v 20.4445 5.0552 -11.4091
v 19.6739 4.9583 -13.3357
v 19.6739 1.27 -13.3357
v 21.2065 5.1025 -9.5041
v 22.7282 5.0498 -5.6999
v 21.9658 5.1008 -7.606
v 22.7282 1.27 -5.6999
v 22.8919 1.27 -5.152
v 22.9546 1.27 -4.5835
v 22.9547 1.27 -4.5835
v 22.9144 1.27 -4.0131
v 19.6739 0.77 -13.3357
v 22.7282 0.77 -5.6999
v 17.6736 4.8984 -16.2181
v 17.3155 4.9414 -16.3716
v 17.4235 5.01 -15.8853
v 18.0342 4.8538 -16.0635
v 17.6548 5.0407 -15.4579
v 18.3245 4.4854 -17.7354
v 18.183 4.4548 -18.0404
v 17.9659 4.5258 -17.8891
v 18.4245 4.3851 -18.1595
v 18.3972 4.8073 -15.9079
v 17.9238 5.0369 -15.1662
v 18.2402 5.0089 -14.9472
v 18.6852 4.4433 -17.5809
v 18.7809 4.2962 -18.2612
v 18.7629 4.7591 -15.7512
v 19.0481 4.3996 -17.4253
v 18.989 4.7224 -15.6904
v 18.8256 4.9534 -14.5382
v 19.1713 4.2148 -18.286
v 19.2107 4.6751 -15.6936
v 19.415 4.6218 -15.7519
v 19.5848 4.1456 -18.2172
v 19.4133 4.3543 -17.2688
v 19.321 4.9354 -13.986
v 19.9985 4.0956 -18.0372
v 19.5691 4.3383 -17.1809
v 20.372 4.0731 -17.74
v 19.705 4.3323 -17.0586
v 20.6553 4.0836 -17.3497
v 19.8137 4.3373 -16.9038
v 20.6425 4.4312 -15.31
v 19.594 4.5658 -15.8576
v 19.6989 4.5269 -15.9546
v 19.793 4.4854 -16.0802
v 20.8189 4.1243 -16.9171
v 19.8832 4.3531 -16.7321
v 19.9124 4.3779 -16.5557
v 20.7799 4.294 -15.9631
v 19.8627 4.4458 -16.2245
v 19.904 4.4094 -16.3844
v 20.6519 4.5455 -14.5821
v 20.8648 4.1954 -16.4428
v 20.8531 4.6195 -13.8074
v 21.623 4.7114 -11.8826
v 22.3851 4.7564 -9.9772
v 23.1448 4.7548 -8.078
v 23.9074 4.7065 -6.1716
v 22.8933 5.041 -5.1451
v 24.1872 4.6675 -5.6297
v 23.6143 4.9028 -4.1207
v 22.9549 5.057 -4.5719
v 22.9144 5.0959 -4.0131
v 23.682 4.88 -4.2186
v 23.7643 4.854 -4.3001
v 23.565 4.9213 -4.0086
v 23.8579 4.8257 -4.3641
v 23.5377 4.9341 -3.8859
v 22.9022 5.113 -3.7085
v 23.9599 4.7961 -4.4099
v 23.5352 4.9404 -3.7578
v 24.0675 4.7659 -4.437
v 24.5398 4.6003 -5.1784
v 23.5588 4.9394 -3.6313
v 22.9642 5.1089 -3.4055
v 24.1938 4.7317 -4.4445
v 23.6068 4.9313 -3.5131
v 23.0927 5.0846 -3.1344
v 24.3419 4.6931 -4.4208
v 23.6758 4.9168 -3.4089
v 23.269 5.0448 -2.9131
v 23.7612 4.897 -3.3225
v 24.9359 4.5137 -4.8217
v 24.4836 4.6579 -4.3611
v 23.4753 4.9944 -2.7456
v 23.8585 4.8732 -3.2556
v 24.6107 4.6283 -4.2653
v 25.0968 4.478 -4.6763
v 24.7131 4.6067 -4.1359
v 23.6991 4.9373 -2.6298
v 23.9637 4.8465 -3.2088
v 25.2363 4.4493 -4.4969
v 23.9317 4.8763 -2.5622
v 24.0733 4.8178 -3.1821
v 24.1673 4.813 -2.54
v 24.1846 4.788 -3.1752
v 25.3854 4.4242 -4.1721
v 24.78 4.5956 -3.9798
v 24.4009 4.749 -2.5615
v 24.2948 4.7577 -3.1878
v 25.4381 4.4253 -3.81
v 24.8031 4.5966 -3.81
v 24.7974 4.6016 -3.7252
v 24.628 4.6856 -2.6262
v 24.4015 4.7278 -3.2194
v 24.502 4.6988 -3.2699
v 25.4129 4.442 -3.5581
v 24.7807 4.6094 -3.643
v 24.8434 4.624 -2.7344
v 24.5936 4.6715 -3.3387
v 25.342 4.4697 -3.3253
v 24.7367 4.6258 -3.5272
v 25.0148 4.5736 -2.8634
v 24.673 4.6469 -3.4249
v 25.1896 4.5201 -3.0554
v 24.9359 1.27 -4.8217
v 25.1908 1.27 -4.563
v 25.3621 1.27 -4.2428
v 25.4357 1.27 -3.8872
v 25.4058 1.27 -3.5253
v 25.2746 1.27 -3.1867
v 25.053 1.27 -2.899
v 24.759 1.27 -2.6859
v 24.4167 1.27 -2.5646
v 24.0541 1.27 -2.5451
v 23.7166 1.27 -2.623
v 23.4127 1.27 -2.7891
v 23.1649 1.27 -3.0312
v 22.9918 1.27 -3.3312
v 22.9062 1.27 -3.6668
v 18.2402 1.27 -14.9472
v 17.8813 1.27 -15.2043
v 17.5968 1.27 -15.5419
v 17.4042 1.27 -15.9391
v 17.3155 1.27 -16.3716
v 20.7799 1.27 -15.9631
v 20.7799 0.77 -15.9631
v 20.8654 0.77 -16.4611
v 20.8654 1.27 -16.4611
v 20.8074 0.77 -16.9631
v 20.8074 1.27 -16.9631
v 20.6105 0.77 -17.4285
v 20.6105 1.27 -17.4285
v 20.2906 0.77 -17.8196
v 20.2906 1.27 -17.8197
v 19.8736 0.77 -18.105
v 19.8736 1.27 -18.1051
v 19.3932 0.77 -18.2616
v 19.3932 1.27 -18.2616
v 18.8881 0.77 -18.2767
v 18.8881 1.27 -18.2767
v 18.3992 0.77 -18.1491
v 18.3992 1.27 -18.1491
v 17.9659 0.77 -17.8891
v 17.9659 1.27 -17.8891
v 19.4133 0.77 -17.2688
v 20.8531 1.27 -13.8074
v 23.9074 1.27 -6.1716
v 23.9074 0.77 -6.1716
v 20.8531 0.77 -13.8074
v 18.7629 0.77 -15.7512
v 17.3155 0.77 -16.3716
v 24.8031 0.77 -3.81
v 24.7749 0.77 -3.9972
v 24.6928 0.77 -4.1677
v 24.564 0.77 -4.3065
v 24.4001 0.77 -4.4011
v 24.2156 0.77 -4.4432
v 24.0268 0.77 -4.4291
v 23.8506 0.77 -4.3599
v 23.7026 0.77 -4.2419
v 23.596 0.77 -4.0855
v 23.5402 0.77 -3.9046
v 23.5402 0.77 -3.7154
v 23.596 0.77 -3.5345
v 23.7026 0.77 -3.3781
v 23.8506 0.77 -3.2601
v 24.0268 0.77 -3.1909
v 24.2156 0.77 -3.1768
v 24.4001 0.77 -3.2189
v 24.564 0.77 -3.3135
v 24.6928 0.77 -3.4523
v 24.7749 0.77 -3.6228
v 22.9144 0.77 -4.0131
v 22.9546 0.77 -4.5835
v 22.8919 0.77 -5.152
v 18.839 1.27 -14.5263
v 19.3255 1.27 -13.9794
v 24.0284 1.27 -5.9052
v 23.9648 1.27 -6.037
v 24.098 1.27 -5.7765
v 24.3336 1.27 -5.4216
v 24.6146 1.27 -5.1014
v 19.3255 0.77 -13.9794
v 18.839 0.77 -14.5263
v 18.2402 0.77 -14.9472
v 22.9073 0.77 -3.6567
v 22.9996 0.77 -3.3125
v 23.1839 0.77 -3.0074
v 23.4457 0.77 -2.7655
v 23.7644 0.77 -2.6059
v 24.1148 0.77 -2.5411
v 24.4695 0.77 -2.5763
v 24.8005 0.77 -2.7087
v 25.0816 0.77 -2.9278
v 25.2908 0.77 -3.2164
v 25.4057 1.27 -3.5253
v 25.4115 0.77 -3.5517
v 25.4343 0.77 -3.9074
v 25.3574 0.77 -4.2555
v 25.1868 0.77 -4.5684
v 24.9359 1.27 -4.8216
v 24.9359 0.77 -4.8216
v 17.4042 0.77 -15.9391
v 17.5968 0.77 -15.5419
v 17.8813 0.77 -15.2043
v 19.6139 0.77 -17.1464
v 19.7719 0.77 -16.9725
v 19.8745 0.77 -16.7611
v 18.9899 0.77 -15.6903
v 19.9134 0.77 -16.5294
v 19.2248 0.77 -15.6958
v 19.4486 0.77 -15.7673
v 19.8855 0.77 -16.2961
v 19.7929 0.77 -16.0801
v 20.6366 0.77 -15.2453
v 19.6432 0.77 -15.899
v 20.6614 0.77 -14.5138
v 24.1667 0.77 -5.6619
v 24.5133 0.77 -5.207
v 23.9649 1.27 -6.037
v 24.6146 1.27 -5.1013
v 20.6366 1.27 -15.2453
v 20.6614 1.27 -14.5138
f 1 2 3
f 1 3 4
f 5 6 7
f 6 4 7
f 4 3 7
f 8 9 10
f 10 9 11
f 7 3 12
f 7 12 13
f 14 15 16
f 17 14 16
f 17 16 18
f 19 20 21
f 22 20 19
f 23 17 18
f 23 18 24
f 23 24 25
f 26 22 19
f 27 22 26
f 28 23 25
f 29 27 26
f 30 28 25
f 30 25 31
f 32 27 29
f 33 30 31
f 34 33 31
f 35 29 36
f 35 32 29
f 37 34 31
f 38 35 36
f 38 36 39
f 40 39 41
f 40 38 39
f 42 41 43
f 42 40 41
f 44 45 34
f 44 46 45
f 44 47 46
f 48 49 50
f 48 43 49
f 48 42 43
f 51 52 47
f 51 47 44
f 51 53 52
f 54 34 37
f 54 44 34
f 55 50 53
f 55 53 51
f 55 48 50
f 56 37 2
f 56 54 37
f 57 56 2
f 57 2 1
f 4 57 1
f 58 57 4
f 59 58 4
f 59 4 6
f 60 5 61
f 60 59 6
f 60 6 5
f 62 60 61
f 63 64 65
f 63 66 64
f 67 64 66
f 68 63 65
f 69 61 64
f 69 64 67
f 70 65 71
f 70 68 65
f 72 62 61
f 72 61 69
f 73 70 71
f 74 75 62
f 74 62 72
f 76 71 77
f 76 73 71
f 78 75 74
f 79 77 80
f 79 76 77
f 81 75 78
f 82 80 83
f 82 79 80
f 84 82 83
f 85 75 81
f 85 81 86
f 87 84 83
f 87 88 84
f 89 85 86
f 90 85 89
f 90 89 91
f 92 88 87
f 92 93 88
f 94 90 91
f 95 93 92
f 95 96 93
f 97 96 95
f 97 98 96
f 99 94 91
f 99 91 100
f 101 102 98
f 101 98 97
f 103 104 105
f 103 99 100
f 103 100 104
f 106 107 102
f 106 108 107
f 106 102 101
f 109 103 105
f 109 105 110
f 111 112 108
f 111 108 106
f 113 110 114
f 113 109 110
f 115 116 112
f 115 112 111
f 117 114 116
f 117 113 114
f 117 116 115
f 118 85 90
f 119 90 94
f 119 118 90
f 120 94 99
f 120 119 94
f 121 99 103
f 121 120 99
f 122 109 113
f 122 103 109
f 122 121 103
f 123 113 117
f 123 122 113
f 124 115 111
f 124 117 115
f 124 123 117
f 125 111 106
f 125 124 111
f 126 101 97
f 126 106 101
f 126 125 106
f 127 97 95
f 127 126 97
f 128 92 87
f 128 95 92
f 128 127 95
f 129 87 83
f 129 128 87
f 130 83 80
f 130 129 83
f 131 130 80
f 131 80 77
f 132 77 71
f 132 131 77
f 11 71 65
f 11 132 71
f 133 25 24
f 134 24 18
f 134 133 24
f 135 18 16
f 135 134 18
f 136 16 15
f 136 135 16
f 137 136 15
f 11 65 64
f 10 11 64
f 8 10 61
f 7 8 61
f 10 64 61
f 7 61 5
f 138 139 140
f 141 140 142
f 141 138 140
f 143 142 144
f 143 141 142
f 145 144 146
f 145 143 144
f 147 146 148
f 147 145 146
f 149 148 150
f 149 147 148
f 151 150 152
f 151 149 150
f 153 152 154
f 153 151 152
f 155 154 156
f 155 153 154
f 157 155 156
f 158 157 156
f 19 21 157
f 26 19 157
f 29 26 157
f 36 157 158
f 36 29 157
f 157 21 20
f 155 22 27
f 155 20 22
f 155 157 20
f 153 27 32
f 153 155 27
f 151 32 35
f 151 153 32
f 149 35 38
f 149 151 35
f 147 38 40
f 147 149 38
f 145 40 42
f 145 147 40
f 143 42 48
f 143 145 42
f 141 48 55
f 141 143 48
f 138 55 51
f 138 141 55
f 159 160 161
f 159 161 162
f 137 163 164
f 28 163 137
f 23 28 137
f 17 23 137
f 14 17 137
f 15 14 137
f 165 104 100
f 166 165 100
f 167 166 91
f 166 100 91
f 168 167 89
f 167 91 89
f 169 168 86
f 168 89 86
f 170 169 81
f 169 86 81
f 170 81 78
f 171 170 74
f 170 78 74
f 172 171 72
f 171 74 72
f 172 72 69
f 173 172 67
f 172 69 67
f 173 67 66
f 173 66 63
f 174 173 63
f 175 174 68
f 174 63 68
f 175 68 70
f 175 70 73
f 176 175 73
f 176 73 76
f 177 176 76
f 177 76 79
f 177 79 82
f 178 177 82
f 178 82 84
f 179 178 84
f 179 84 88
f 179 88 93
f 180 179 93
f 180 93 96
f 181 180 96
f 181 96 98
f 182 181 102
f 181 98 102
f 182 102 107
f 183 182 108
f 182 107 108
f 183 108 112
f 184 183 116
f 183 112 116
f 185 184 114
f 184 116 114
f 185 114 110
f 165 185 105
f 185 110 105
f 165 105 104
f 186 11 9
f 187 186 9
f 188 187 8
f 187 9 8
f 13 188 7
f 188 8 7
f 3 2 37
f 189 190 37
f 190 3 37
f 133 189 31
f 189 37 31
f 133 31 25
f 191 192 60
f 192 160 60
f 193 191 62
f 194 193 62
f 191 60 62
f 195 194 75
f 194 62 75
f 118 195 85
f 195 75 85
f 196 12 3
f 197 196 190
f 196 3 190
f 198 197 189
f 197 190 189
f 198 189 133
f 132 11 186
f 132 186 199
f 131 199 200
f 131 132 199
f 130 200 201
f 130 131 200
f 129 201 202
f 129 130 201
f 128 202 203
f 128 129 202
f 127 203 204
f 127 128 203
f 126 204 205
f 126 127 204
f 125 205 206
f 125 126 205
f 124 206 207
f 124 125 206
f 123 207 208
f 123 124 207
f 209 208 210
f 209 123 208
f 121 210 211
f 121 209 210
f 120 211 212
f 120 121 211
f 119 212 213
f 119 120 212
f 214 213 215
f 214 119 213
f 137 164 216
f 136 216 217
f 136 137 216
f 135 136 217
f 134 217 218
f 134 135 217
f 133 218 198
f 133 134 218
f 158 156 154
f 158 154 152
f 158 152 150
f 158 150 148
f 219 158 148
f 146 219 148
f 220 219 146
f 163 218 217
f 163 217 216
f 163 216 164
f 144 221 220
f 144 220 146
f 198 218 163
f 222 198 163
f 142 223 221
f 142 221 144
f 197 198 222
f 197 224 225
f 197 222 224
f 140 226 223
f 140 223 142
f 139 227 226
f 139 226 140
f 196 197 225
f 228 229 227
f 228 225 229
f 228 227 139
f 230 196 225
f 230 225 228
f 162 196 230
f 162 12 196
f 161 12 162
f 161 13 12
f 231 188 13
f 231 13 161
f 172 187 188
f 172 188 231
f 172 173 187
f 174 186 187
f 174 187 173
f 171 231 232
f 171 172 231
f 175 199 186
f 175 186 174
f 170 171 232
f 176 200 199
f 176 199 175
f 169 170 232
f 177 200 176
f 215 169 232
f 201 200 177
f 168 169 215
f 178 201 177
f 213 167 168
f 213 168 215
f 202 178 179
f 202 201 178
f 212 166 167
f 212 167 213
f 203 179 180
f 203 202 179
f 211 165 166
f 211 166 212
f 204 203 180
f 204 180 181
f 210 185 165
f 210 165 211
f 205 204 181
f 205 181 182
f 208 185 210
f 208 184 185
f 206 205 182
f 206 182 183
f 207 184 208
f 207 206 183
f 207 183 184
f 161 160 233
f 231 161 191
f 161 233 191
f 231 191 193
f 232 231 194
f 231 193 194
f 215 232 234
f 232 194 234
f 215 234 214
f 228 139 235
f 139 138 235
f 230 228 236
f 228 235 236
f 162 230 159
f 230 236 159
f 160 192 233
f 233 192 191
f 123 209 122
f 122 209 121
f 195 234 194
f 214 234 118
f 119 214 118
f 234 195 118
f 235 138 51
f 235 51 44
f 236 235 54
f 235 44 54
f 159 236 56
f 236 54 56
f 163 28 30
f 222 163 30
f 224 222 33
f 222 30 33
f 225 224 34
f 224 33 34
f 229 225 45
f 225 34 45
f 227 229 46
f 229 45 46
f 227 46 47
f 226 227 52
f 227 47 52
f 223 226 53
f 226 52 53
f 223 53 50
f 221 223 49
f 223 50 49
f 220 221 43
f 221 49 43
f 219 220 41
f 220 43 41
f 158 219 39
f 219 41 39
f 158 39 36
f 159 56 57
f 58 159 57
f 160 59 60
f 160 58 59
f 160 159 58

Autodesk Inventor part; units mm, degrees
ref_plane "YZ Plane" through (0, 0, 0) normal (1, 0, 0) x (0, 1, 0)
ref_plane "XZ Plane" through (0, 0, 0) normal (0, 1, 0) x (-1, 0, 0)
sketch "Sketch1" plane through (0, 0, 0) normal (0, 0, 1) x (1, 0, 0)
  line L0 (0, 0) -> (0, 8.6646) construction
  line L1 (20.9931, 1.27) -> (20.9931, 5.715)
  line L2 (20.9931, 5.715) -> (27.9781, 3.81)
  line L3 (27.9781, 3.81) -> (27.9781, 0)
  line L4 (27.9781, 0) -> (20.9931, 0)
  line L5 (20.9931, 1.27) -> (18.4531, 1.27)
  line L6 (18.4531, 1.27) -> (18.4531, 0)
  line L7 (18.4531, 0) -> (20.9931, 0)
  dimension "d0" = 20.9931
  dimension "d1" = 4.445
  dimension "d2" = 1.27
  dimension "d3" = 2.54
  dimension "d4" = 3.81
  dimension "d5" = 6.985
revolve "Revolution1" add sketch "Sketch1" angle 360 about axis through (0, 0, 0) along (0, 1, 0)
ref_plane "Work Plane1" through (0, 3.81, 0) normal (0, 1, 0) x (1, 0, 0)
sketch "Sketch2" plane through (0, 0, 0) normal (0, -1, 0) x (1, 0, 0)
  line L0 (0, 0) -> (-45.8206, 0) construction
  circle A0 centre (0, 0) radius 27.9781 projected
  line L1 (-27.6227, 4.445) -> (-30.5181, 2.54)
  line L2 (-30.5181, 2.54) -> (-30.5181, -2.54)
  line L3 (-30.5181, -2.54) -> (-27.6227, -4.445)
  dimension "d7" = 2.54
  dimension "d8" = 8.89
  dimension "d9" = 5.08
extrude "Extrusion1" add sketch "Sketch2" against normal up to surface (3.81 mm away) contours A0 L3 L2 L1
pattern_circular "Circular Pattern1" count 12 over 360 about axis through (0, 1.905, 0) along (0, -1, 0) of "Extrusion1"
sketch "Sketch3" plane through (0, 1.27, 0) normal (0, 1, 0) x (1, 0, 0)
  circle A0 centre (0, 0) radius 18.4531 projected
  circle A1 centre (0, 0) radius 18.4531 projected
  circle A2 centre (0, 0) radius 20.9931 projected
  circle A3 centre (0, 0) radius 20.9931 projected
  arc A4 (-26.1445, 9.9619) -> (-27.6227, 4.445) centre (0, 0) ccw projected
  arc A5 (-27.6227, 4.445) -> (-27.6227, -4.445) centre (0, 0) ccw projected
  arc A6 (-27.6227, -4.445) -> (-26.1445, -9.9619) centre (0, 0) ccw projected
  arc A7 (-26.1445, -9.9619) -> (-21.6995, -17.6609) centre (0, 0) ccw projected
  arc A8 (-21.6995, -17.6609) -> (-17.6609, -21.6995) centre (0, 0) ccw projected
  arc A9 (-17.6609, -21.6995) -> (-9.9619, -26.1445) centre (0, 0) ccw projected
  arc A10 (-9.9619, -26.1445) -> (-4.445, -27.6227) centre (0, 0) ccw projected
  arc A11 (-4.445, -27.6227) -> (4.445, -27.6227) centre (0, 0) ccw projected
  arc A12 (4.445, -27.6227) -> (9.9619, -26.1445) centre (0, 0) ccw projected
  arc A13 (9.9619, -26.1445) -> (17.6609, -21.6995) centre (0, 0) ccw projected
  arc A14 (17.6609, -21.6995) -> (21.6995, -17.6609) centre (0, 0) ccw projected
  arc A15 (21.6995, -17.6609) -> (26.1445, -9.9619) centre (0, 0) ccw projected
  arc A16 (26.1445, -9.9619) -> (27.6227, -4.445) centre (0, 0) ccw projected
  arc A17 (27.6227, -4.445) -> (27.6227, 4.445) centre (0, 0) ccw projected
  arc A18 (27.6227, 4.445) -> (26.1445, 9.9619) centre (0, 0) ccw projected
  arc A19 (26.1445, 9.9619) -> (21.6995, 17.6609) centre (0, 0) ccw projected
  arc A20 (21.6995, 17.6609) -> (17.6609, 21.6995) centre (0, 0) ccw projected
  arc A21 (17.6609, 21.6995) -> (9.9619, 26.1445) centre (0, 0) ccw projected
  arc A22 (9.9619, 26.1445) -> (4.445, 27.6227) centre (0, 0) ccw projected
  arc A23 (4.445, 27.6227) -> (-4.445, 27.6227) centre (0, 0) ccw projected
  arc A24 (-4.445, 27.6227) -> (-9.9619, 26.1445) centre (0, 0) ccw projected
  arc A25 (-9.9619, 26.1445) -> (-17.6609, 21.6995) centre (0, 0) ccw projected
  arc A26 (-17.6609, 21.6995) -> (-21.6995, 17.6609) centre (0, 0) ccw projected
  arc A27 (-21.6995, 17.6609) -> (-26.1445, 9.9619) centre (0, 0) ccw projected
  circle A28 centre (0, 0) radius 22.8981
  spline S0 degree 2 poles (-20.4865, -10.8927) (-20.2314, -10.7347) (-20.0767, -10.9844) knots 0 0 0 1 1 1
  spline S1 degree 2 poles (-20.0767, -10.9844) (-19.9219, -11.2342) (-20.177, -11.3922) knots 0 0 0 1 1 1
  line L0 (-20.177, -11.3922) -> (-22.4984, -12.8306)
  line L1 (-22.4984, -12.8306) -> (-21.0657, -12.8234)
  spline S2 degree 2 poles (-21.0657, -12.8234) (-20.8353, -12.8371) (-20.7343, -13.0001) knots 0 0 0 1 1 1
  spline S3 degree 2 poles (-20.7343, -13.0001) (-20.6366, -13.1578) (-20.7235, -13.3463) knots 0 0 0 1 1 1
  line L2 (-20.7235, -13.3463) -> (-21.4078, -14.6436)
  line L3 (-21.4078, -14.6436) -> (-19.0627, -13.1905)
  spline S4 degree 2 poles (-19.0627, -13.1905) (-18.8077, -13.0325) (-18.6529, -13.2822) knots 0 0 0 1 1 1
  spline S5 degree 2 poles (-18.6529, -13.2822) (-18.4949, -13.5373) (-18.7499, -13.6953) knots 0 0 0 1 1 1
  line L4 (-18.7499, -13.6953) -> (-21.6577, -15.497)
  spline S6 degree 2 poles (-21.6577, -15.497) (-21.9259, -15.6631) (-22.0936, -15.3923) knots 0 0 0 1 1 1
  spline S7 degree 2 poles (-22.0936, -15.3923) (-22.2093, -15.2057) (-22.1246, -15.0076) knots 0 0 0 1 1 1
  line L5 (-22.1246, -15.0076) -> (-21.3965, -13.3994)
  line L6 (-21.3965, -13.3994) -> (-23.1279, -13.3298)
  spline S8 degree 2 poles (-23.1279, -13.3298) (-23.414, -13.3142) (-23.5248, -13.1355) knots 0 0 0 1 1 1
  spline S9 degree 2 poles (-23.5248, -13.1355) (-23.5932, -13.025) (-23.5178, -12.7709) (-23.3942, -12.6944) knots 0 0 0 1 2 2 2
  line L7 (-23.3942, -12.6944) -> (-20.4865, -10.8927)
  line L8 (-21.4115, -8.1592) -> (-20.6563, -9.942)
  line L9 (-20.6563, -9.942) -> (-23.6894, -11.2268)
  line L10 (-23.6894, -11.2268) -> (-24.4445, -9.444)
  spline S10 degree 2 poles (-24.4445, -9.444) (-24.5591, -9.1734) (-24.2914, -9.06) knots 0 0 0 1 1 1
  spline S11 degree 2 poles (-24.2914, -9.06) (-24.0209, -8.9454) (-23.9063, -9.216) knots 0 0 0 1 1 1
  line L11 (-23.9063, -9.216) -> (-23.3743, -10.4719)
  line L12 (-23.3743, -10.4719) -> (-22.8189, -10.2367)
  line L13 (-22.8189, -10.2367) -> (-23.3171, -9.0605)
  spline S12 degree 2 poles (-23.3171, -9.0605) (-23.4293, -8.7956) (-23.1616, -8.6822) knots 0 0 0 1 1 1
  spline S13 degree 2 poles (-23.1616, -8.6822) (-22.8854, -8.5652) (-22.7732, -8.8301) knots 0 0 0 1 1 1
  line L14 (-22.7732, -8.8301) -> (-22.275, -10.0063)
  line L15 (-22.275, -10.0063) -> (-21.4235, -9.6456)
  line L16 (-21.4235, -9.6456) -> (-21.9554, -8.3897)
  spline S14 degree 2 poles (-21.9554, -8.3897) (-22.07, -8.1191) (-21.8023, -8.0057) knots 0 0 0 1 1 1
  spline S15 degree 2 poles (-21.8023, -8.0057) (-21.5261, -7.8887) (-21.4115, -8.1592) knots 0 0 0 1 1 1
  spline S16 degree 2 poles (-22.8056, -5.2377) (-22.4484, -5.3877) (-22.1014, -5.7752) (-22.015, -6.0818) knots 0 0 0 1 2 2 2
  spline S17 degree 2 poles (-22.015, -6.0818) (-21.8732, -6.5849) (-22.313, -7.0655) knots 0 0 0 1 1 1
  spline S18 degree 2 poles (-22.313, -7.0655) (-22.5945, -7.4918) (-23.3387, -7.7016) knots 0 0 0 1 1 1
  spline S19 degree 2 poles (-23.3387, -7.7016) (-24.1544, -7.9314) (-24.69, -7.6614) knots 0 0 0 1 1 1
  spline S20 degree 2 poles (-24.69, -7.6614) (-25.1213, -7.4423) (-25.2479, -6.9928) knots 0 0 0 1 1 1
  spline S21 degree 2 poles (-25.2479, -6.9928) (-25.3444, -6.6505) (-25.2198, -6.1462) (-24.9563, -5.8953) knots 0 0 0 1 2 2 2
  spline S22 degree 2 poles (-24.9563, -5.8953) (-24.9018, -5.8381) (-24.8303, -5.818) knots 0 0 0 1 1 1
  spline S23 degree 2 poles (-24.8303, -5.818) (-24.7112, -5.7844) (-24.4997, -5.908) (-24.4678, -6.0211) knots 0 0 0 1 2 2 2
  spline S24 degree 2 poles (-24.4678, -6.0211) (-24.4242, -6.1759) (-24.5806, -6.3164) knots 0 0 0 1 1 1
  spline S25 degree 2 poles (-24.5806, -6.3164) (-24.7683, -6.517) (-24.6827, -6.8207) knots 0 0 0 1 1 1
  spline S26 degree 2 poles (-24.6827, -6.8207) (-24.6139, -7.0648) (-24.3475, -7.1664) knots 0 0 0 1 1 1
  spline S27 degree 2 poles (-24.3475, -7.1664) (-24.0157, -7.2947) (-23.4948, -7.1479) knots 0 0 0 1 1 1
  spline S28 degree 2 poles (-23.4948, -7.1479) (-23.0095, -7.0111) (-22.5148, -6.4861) (-22.587, -6.2301) knots 0 0 0 1 2 2 2
  spline S29 degree 2 poles (-22.587, -6.2301) (-22.6767, -5.9116) (-22.9983, -5.774) knots 0 0 0 1 1 1
  spline S30 degree 2 poles (-22.9983, -5.774) (-23.1807, -5.7194) (-23.2168, -5.5914) knots 0 0 0 1 1 1
  spline S31 degree 2 poles (-23.2168, -5.5914) (-23.2487, -5.4783) (-23.1196, -5.2523) (-23.0064, -5.2204) knots 0 0 0 1 2 2 2
  spline S32 degree 2 poles (-23.0064, -5.2204) (-22.9082, -5.1928) (-22.8056, -5.2377) knots 0 0 0 1 1 1
  spline S33 degree 2 poles (-23.0841, -2.194) (-22.7873, -2.1504) (-22.7455, -2.435) knots 0 0 0 1 1 1
  spline S34 degree 2 poles (-22.7455, -2.435) (-22.7028, -2.7257) (-22.9996, -2.7693) knots 0 0 0 1 1 1
  line L17 (-22.9996, -2.7693) -> (-24.1563, -2.9392)
  line L18 (-24.1563, -2.9392) -> (-23.9877, -4.0867)
  line L19 (-23.9877, -4.0867) -> (-22.8311, -3.9168)
  spline S35 degree 2 poles (-22.8311, -3.9168) (-22.5342, -3.8732) (-22.4915, -4.1639) knots 0 0 0 1 1 1
  spline S36 degree 2 poles (-22.4915, -4.1639) (-22.4488, -4.4546) (-22.7456, -4.4982) knots 0 0 0 1 1 1
  line L20 (-22.7456, -4.4982) -> (-25.4599, -4.8969)
  spline S37 degree 2 poles (-25.4599, -4.8969) (-25.7536, -4.9401) (-25.7963, -4.6494) knots 0 0 0 1 1 1
  spline S38 degree 2 poles (-25.7963, -4.6494) (-25.839, -4.3587) (-25.5453, -4.3155) knots 0 0 0 1 1 1
  line L21 (-25.5453, -4.3155) -> (-24.5722, -4.1726)
  line L22 (-24.5722, -4.1726) -> (-24.7408, -3.0251)
  line L23 (-24.7408, -3.0251) -> (-25.7139, -3.168)
  spline S39 degree 2 poles (-25.7139, -3.168) (-26.0076, -3.2112) (-26.0503, -2.9205) knots 0 0 0 1 1 1
  spline S40 degree 2 poles (-26.0503, -2.9205) (-26.0921, -2.6359) (-25.7984, -2.5928) knots 0 0 0 1 1 1
  line L24 (-25.7984, -2.5928) -> (-23.0841, -2.194)
  spline S41 degree 2 poles (-23.2836, 1.208) (-23.2064, 1.2364) (-23.1539, 1.2367) knots 0 0 0 1 1 1
  spline S42 degree 2 poles (-23.1539, 1.2367) (-23.0302, 1.2375) (-22.8651, 1.053) (-22.8643, 0.9323) knots 0 0 0 1 2 2 2
  spline S43 degree 2 poles (-22.8643, 0.9323) (-22.8631, 0.7437) (-23.042, 0.6683) knots 0 0 0 1 1 1
  line L25 (-23.042, 0.6683) -> (-23.4523, 0.5049)
  line L26 (-23.4523, 0.5049) -> (-23.4439, -0.8127)
  line L27 (-23.4439, -0.8127) -> (-23.0192, -0.9677)
  spline S44 degree 2 poles (-23.0192, -0.9677) (-22.8518, -1.0347) (-22.8505, -1.2295) knots 0 0 0 1 1 1
  spline S45 degree 2 poles (-22.8505, -1.2295) (-22.8498, -1.3439) (-23.0064, -1.5305) (-23.1301, -1.5313) knots 0 0 0 1 2 2 2
  spline S46 degree 2 poles (-23.1301, -1.5313) (-23.1826, -1.5316) (-23.2322, -1.5134) knots 0 0 0 1 1 1
  line L28 (-23.2322, -1.5134) -> (-26.0565, -0.4767)
  spline S47 degree 2 poles (-26.0565, -0.4767) (-26.2212, -0.3571) (-26.2222, -0.1963) knots 0 0 0 1 1 1
  spline S48 degree 2 poles (-26.2222, -0.1963) (-26.2233, -0.0262) (-26.0632, 0.0924) knots 0 0 0 1 1 1
  line L29 (-26.0632, 0.0924) -> (-23.2836, 1.208)
  line L30 (-24.0233, 0.3126) -> (-25.2852, -0.1749)
  line L31 (-25.2852, -0.1749) -> (-24.0173, -0.6307)
  line L32 (-24.0173, -0.6307) -> (-24.0233, 0.3126)
  spline S49 degree 2 poles (-22.7917, 4.2665) (-22.4883, 4.2255) (-22.5223, 3.9742) knots 0 0 0 1 1 1
  spline S50 degree 2 poles (-22.5223, 3.9742) (-22.5451, 3.8056) (-22.7963, 3.7022) knots 0 0 0 1 1 1
  line L33 (-22.7963, 3.7022) -> (-24.9996, 2.6644)
  line L34 (-24.9996, 2.6644) -> (-23.038, 2.3991)
  spline S51 degree 2 poles (-23.038, 2.3991) (-22.7407, 2.3589) (-22.7793, 2.0739) knots 0 0 0 1 1 1
  spline S52 degree 2 poles (-22.7793, 2.0739) (-22.8178, 1.7888) (-23.1151, 1.8291) knots 0 0 0 1 1 1
  line L35 (-23.1151, 1.8291) -> (-25.8582, 2.2)
  spline S53 degree 2 poles (-25.8582, 2.2) (-26.1463, 2.239) (-26.109, 2.5148) knots 0 0 0 1 1 1
  spline S54 degree 2 poles (-26.109, 2.5148) (-26.0867, 2.6803) (-25.9475, 2.6709) knots 0 0 0 1 1 1
  line L36 (-25.9475, 2.6709) -> (-23.6718, 3.805)
  line L37 (-23.6718, 3.805) -> (-25.5813, 4.0632)
  spline S55 degree 2 poles (-25.5813, 4.0632) (-25.8755, 4.103) (-25.837, 4.3881) knots 0 0 0 1 1 1
  spline S56 degree 2 poles (-25.837, 4.3881) (-25.7984, 4.6731) (-25.5042, 4.6333) knots 0 0 0 1 1 1
  line L38 (-25.5042, 4.6333) -> (-22.7917, 4.2665)
  spline S57 degree 2 poles (-22.4654, 5.6266) (-22.1736, 5.5569) (-22.2419, 5.2711) knots 0 0 0 1 1 1
  spline S58 degree 2 poles (-22.2419, 5.2711) (-22.3101, 4.9853) (-22.6019, 5.055) knots 0 0 0 1 1 1
  line L39 (-22.6019, 5.055) -> (-25.2702, 5.6925)
  spline S59 degree 2 poles (-25.2702, 5.6925) (-25.559, 5.7615) (-25.4907, 6.0473) knots 0 0 0 1 1 1
  spline S60 degree 2 poles (-25.4907, 6.0473) (-25.4224, 6.3331) (-25.1336, 6.2641) knots 0 0 0 1 1 1
  line L40 (-25.1336, 6.2641) -> (-22.4654, 5.6266)
  spline S61 degree 2 poles (-21.7348, 8.6674) (-21.5264, 8.3409) (-21.4615, 7.8248) (-21.5649, 7.5235) knots 0 0 0 1 2 2 2
  spline S62 degree 2 poles (-21.5649, 7.5235) (-21.7346, 7.0291) (-22.3696, 6.8841) knots 0 0 0 1 1 1
  spline S63 degree 2 poles (-22.3696, 6.8841) (-22.8437, 6.6936) (-23.5751, 6.9445) knots 0 0 0 1 1 1
  spline S64 degree 2 poles (-23.5751, 6.9445) (-24.3766, 7.2196) (-24.6635, 7.7463) knots 0 0 0 1 1 1
  spline S65 degree 2 poles (-24.6635, 7.7463) (-24.8935, 8.1719) (-24.7419, 8.6136) knots 0 0 0 1 1 1
  spline S66 degree 2 poles (-24.7419, 8.6136) (-24.6265, 8.95) (-24.2371, 9.2938) (-23.8777, 9.3503) knots 0 0 0 1 2 2 2
  spline S67 degree 2 poles (-23.8777, 9.3503) (-23.8003, 9.3663) (-23.7301, 9.3422) knots 0 0 0 1 1 1
  spline S68 degree 2 poles (-23.7301, 9.3422) (-23.6131, 9.3021) (-23.5094, 9.0801) (-23.5475, 8.9689) knots 0 0 0 1 2 2 2
  spline S69 degree 2 poles (-23.5475, 8.9689) (-23.5997, 8.8168) (-23.8083, 8.7903) knots 0 0 0 1 1 1
  spline S70 degree 2 poles (-23.8083, 8.7903) (-24.0768, 8.732) (-24.1792, 8.4336) knots 0 0 0 1 1 1
  spline S71 degree 2 poles (-24.1792, 8.4336) (-24.2615, 8.1937) (-24.1002, 7.9585) knots 0 0 0 1 1 1
  spline S72 degree 2 poles (-24.1002, 7.9585) (-23.9003, 7.6643) (-23.3884, 7.4887) knots 0 0 0 1 1 1
  spline S73 degree 2 poles (-23.3884, 7.4887) (-22.9115, 7.3251) (-22.206, 7.4754) (-22.1197, 7.7269) knots 0 0 0 1 2 2 2
  spline S74 degree 2 poles (-22.1197, 7.7269) (-22.0123, 8.04) (-22.1984, 8.336) knots 0 0 0 1 1 1
  spline S75 degree 2 poles (-22.1984, 8.336) (-22.3174, 8.4847) (-22.2743, 8.6105) knots 0 0 0 1 1 1
  spline S76 degree 2 poles (-22.2743, 8.6105) (-22.2361, 8.7217) (-22.0014, 8.8341) (-21.8902, 8.7959) knots 0 0 0 1 2 2 2
  spline S77 degree 2 poles (-21.8902, 8.7959) (-21.7937, 8.7628) (-21.7348, 8.6674) knots 0 0 0 1 1 1
  spline S78 degree 2 poles (-20.1702, 11.694) (-20.0886, 11.684) (-20.0417, 11.6603) knots 0 0 0 1 1 1
  spline S79 degree 2 poles (-20.0417, 11.6603) (-19.9312, 11.6046) (-19.8684, 11.3651) (-19.9228, 11.2574) knots 0 0 0 1 2 2 2
  spline S80 degree 2 poles (-19.9228, 11.2574) (-20.0077, 11.0889) (-20.2013, 11.1035) knots 0 0 0 1 1 1
  line L41 (-20.2013, 11.1035) -> (-20.641, 11.1451)
  line L42 (-20.641, 11.1451) -> (-21.2344, 9.9688)
  line L43 (-21.2344, 9.9688) -> (-20.9272, 9.6371)
  spline S81 degree 2 poles (-20.9272, 9.6371) (-20.8087, 9.5011) (-20.8965, 9.3272) knots 0 0 0 1 1 1
  spline S82 degree 2 poles (-20.8965, 9.3272) (-20.948, 9.225) (-21.1724, 9.1304) (-21.2829, 9.1861) knots 0 0 0 1 2 2 2
  spline S83 degree 2 poles (-21.2829, 9.1861) (-21.3298, 9.2098) (-21.3656, 9.2486) knots 0 0 0 1 1 1
  line L44 (-21.3656, 9.2486) -> (-23.4063, 11.4593)
  spline S84 degree 2 poles (-23.4063, 11.4593) (-23.4983, 11.6408) (-23.4258, 11.7844) knots 0 0 0 1 1 1
  spline S85 degree 2 poles (-23.4258, 11.7844) (-23.3492, 11.9363) (-23.1527, 11.9688) knots 0 0 0 1 1 1
  line L45 (-23.1527, 11.9688) -> (-20.1702, 11.694)
  line L46 (-21.2369, 11.2344) -> (-22.5822, 11.3761)
  line L47 (-22.5822, 11.3761) -> (-21.6617, 10.3922)
  line L48 (-21.6617, 10.3922) -> (-21.2369, 11.2344)
  line L49 (-18.3775, 13.6927) -> (-19.469, 12.0936)
  line L50 (-19.469, 12.0936) -> (-21.9443, 13.7831)
  spline S86 degree 2 poles (-21.9443, 13.7831) (-22.1896, 13.9505) (-22.0274, 14.188) knots 0 0 0 1 1 1
  spline S87 degree 2 poles (-22.0274, 14.188) (-21.867, 14.4231) (-21.6218, 14.2557) knots 0 0 0 1 1 1
  line L51 (-21.6218, 14.2557) -> (-19.6343, 12.8992)
  line L52 (-19.6343, 12.8992) -> (-18.8654, 14.0258)
  spline S88 degree 2 poles (-18.8654, 14.0258) (-18.6998, 14.2684) (-18.4597, 14.1045) knots 0 0 0 1 1 1
  spline S89 degree 2 poles (-18.4597, 14.1045) (-18.2119, 13.9354) (-18.3775, 13.6927) knots 0 0 0 1 1 1
  dimension "d16" = 1.905
extrude "Extrusion2" cut sketch "Sketch3" along normal blind 25.4 contours S5 L4 S6 S7 L5 L6 S8 S9 L7 S0 A28 S1 L0 L1 S2 S3 L2 L3 S4 | L8 L9 L10 S10 S11 L11 L12 L13 S12 S13 L14 L15 L16 S14 S15 | L49 L50 S86 S87 L51 L52 S88 S89 | A28 S0 S1 | S79 S80 A28 | A28 S80 L41 L42 L43 S81 S82 S83 L44 S84 S85 L45 S78 S79 | S17 S18 S19 S20 S21 S22 S23 S24 S25 S26 S27 S28 S29 S30 S31 S32 S16 A28 | A28 S16 S17 | S81 S82 A28 | S36 L20 S37 S38 L21 L22 L23 S39 S40 L24 S33 A28 S34 L17 L18 L19 S35 | A28 S35 S36 | S61 S62 A28 | A28 S62 S63 S64 S65 S66 S67 S68 S69 S70 S71 S72 S73 S74 S75 S76 S77 S61 | A28 S33 S34 | S57 S58 A28 | A28 S58 L39 S59 S60 L40 S57 | S45 S46 L28 S47 S48 L29 S41 S42 A28 S43 L25 L26 L27 S44 | A28 S44 S45 | S49 S50 A28 | A28 S50 L33 L34 S51 S52 L35 S53 S54 L36 L37 S55 S56 L38 S49 | A28 S42 S43 | S51 S52 A28
sketch "Sketch4" plane through (0, 1.27, 0) normal (0, 1, 0) x (1, 0, 0)
  line L0 (-22.7963, 3.7022) -> (-24.9996, 2.6644) projected
  line L1 (-24.9996, 2.6644) -> (-23.038, 2.3991) projected
  line L2 (-23.1151, 1.8291) -> (-25.8582, 2.2) projected
  line L3 (-25.9475, 2.6709) -> (-23.6718, 3.805) projected
  line L4 (-23.6718, 3.805) -> (-25.5813, 4.0632) projected
  line L5 (-25.5042, 4.6333) -> (-22.7917, 4.2665) projected
  line L6 (-23.042, 0.6683) -> (-23.4523, 0.5049) projected
  line L7 (-23.4523, 0.5049) -> (-23.4439, -0.8127) projected
  line L8 (-23.4439, -0.8127) -> (-23.0192, -0.9677) projected
  line L9 (-23.2322, -1.5134) -> (-26.0565, -0.4767) projected
  line L10 (-26.0632, 0.0924) -> (-23.2836, 1.208) projected
  line L11 (-20.177, -11.3922) -> (-22.4984, -12.8306) projected
  line L12 (-22.4984, -12.8306) -> (-21.0657, -12.8234) projected
  line L13 (-20.7235, -13.3463) -> (-21.4078, -14.6436) projected
  line L14 (-21.4078, -14.6436) -> (-19.0627, -13.1905) projected
  line L15 (-18.7499, -13.6953) -> (-21.6577, -15.497) projected
  line L16 (-22.1246, -15.0076) -> (-21.3965, -13.3994) projected
  line L17 (-21.3965, -13.3994) -> (-23.1279, -13.3298) projected
  line L18 (-23.3942, -12.6944) -> (-20.4865, -10.8927) projected
  line L19 (-20.6563, -9.942) -> (-23.6894, -11.2268) projected
  line L20 (-23.6894, -11.2268) -> (-24.4445, -9.444) projected
  line L21 (-23.9063, -9.216) -> (-23.3743, -10.4719) projected
  line L22 (-23.3743, -10.4719) -> (-22.8189, -10.2367) projected
  line L23 (-22.8189, -10.2367) -> (-23.3171, -9.0605) projected
  line L24 (-22.7732, -8.8301) -> (-22.275, -10.0063) projected
  line L25 (-22.275, -10.0063) -> (-21.4235, -9.6456) projected
  line L26 (-21.4235, -9.6456) -> (-21.9554, -8.3897) projected
  line L27 (-21.4115, -8.1592) -> (-20.6563, -9.942) projected
  line L28 (-22.9996, -2.7693) -> (-24.1563, -2.9392) projected
  line L29 (-24.1563, -2.9392) -> (-23.9877, -4.0867) projected
  line L30 (-23.9877, -4.0867) -> (-22.8311, -3.9168) projected
  line L31 (-22.7456, -4.4982) -> (-25.4599, -4.8969) projected
  line L32 (-25.5453, -4.3155) -> (-24.5722, -4.1726) projected
  line L33 (-24.5722, -4.1726) -> (-24.7408, -3.0251) projected
  line L34 (-24.7408, -3.0251) -> (-25.7139, -3.168) projected
  line L35 (-25.7984, -2.5928) -> (-23.0841, -2.194) projected
  line L36 (-22.6019, 5.055) -> (-25.2702, 5.6925) projected
  line L37 (-25.1336, 6.2641) -> (-22.4654, 5.6266) projected
  line L38 (-20.2013, 11.1035) -> (-20.641, 11.1451) projected
  line L39 (-20.641, 11.1451) -> (-21.2344, 9.9688) projected
  line L40 (-21.2344, 9.9688) -> (-20.9272, 9.6371) projected
  line L41 (-21.3656, 9.2486) -> (-23.4063, 11.4593) projected
  line L42 (-23.1527, 11.9688) -> (-20.1702, 11.694) projected
  line L43 (-19.469, 12.0936) -> (-21.9443, 13.7831) projected
  line L44 (-21.6218, 14.2557) -> (-19.6343, 12.8992) projected
  line L45 (-19.6343, 12.8992) -> (-18.8654, 14.0258) projected
  line L46 (-18.3775, 13.6927) -> (-19.469, 12.0936) projected
  circle A0 centre (0, 0) radius 20.9931 projected
  arc A1 (-26.1445, 9.9619) -> (-27.6227, 4.445) centre (0, 0) ccw projected
  arc A2 (-27.6227, 4.445) -> (-27.6227, -4.445) centre (0, 0) ccw projected
  arc A3 (-27.6227, -4.445) -> (-26.1445, -9.9619) centre (0, 0) ccw projected
  arc A4 (-26.1445, -9.9619) -> (-21.6995, -17.6609) centre (0, 0) ccw projected
  arc A5 (-21.6995, -17.6609) -> (-17.6609, -21.6995) centre (0, 0) ccw projected
  arc A6 (-17.6609, -21.6995) -> (-9.9619, -26.1445) centre (0, 0) ccw projected
  arc A7 (-9.9619, -26.1445) -> (-4.445, -27.6227) centre (0, 0) ccw projected
  arc A8 (-4.445, -27.6227) -> (4.445, -27.6227) centre (0, 0) ccw projected
  arc A9 (4.445, -27.6227) -> (9.9619, -26.1445) centre (0, 0) ccw projected
  arc A10 (9.9619, -26.1445) -> (17.6609, -21.6995) centre (0, 0) ccw projected
  arc A11 (17.6609, -21.6995) -> (21.6995, -17.6609) centre (0, 0) ccw projected
  arc A12 (21.6995, -17.6609) -> (26.1445, -9.9619) centre (0, 0) ccw projected
  arc A13 (26.1445, -9.9619) -> (27.6227, -4.445) centre (0, 0) ccw projected
  arc A14 (27.6227, -4.445) -> (27.6227, 4.445) centre (0, 0) ccw projected
  arc A15 (27.6227, 4.445) -> (26.1445, 9.9619) centre (0, 0) ccw projected
  arc A16 (26.1445, 9.9619) -> (21.6995, 17.6609) centre (0, 0) ccw projected
  arc A17 (21.6995, 17.6609) -> (17.6609, 21.6995) centre (0, 0) ccw projected
  arc A18 (17.6609, 21.6995) -> (9.9619, 26.1445) centre (0, 0) ccw projected
  arc A19 (9.9619, 26.1445) -> (4.445, 27.6227) centre (0, 0) ccw projected
  arc A20 (4.445, 27.6227) -> (-4.445, 27.6227) centre (0, 0) ccw projected
  arc A21 (-4.445, 27.6227) -> (-9.9619, 26.1445) centre (0, 0) ccw projected
  arc A22 (-9.9619, 26.1445) -> (-17.6609, 21.6995) centre (0, 0) ccw projected
  arc A23 (-17.6609, 21.6995) -> (-21.6995, 17.6609) centre (0, 0) ccw projected
  arc A24 (-21.6995, 17.6609) -> (-26.1445, 9.9619) centre (0, 0) ccw projected
  circle A25 centre (0, 0) radius 18.4531 projected
  circle A26 centre (0, 0) radius 20.9931 projected
  circle A27 centre (24.1681, -3.81) radius 1.27
  circle A28 centre (24.1681, -3.81) radius 0.635
  line L47 (30.5181, 2.54) -> (30.5181, -2.54) projected
  arc A29 (17.9659, -17.8891) -> (17.3155, -16.3716) centre (19.0881, -16.51) ccw
  line L48 (19.0881, -16.51) -> (15.2571, -18.1519) construction
  line L49 (18.7629, -15.7512) -> (17.3155, -16.3716)
  line L50 (17.9659, -17.8891) -> (19.4133, -17.2688)
  arc A30 (19.4133, -17.2688) -> (18.7629, -15.7512) centre (19.0881, -16.51) ccw
  line L51 (19.0881, -16.51) -> (24.1681, -3.81) construction
  line L52 (19.1153, -14.7322) -> (23.17, -4.5954)
  line L53 (20.2945, -15.2039) -> (24.3492, -5.067)
  line L54 (0, 0) -> (36.9495, 0) construction
  arc A31 (26.1445, 9.9619) -> (21.6995, 17.6609) centre (0, 0) ccw
  arc A32 (27.6227, 4.445) -> (26.1445, 9.9619) centre (0, 0) ccw
  circle A33 centre (24.1681, 3.81) radius 1.27
  circle A34 centre (24.1681, 3.81) radius 0.635
  arc A35 (17.3155, 16.3716) -> (17.9659, 17.8891) centre (19.0881, 16.51) ccw
  line L55 (19.0881, 16.51) -> (15.2571, 18.1519) construction
  line L56 (18.7629, 15.7512) -> (17.3155, 16.3716)
  line L57 (17.9659, 17.8891) -> (19.4133, 17.2688)
  arc A36 (18.7629, 15.7512) -> (19.4133, 17.2688) centre (19.0881, 16.51) ccw
  line L58 (19.0881, 16.51) -> (24.1681, 3.81) construction
  line L59 (19.1153, 14.7322) -> (23.17, 4.5954)
  line L60 (20.2945, 15.2039) -> (24.3492, 5.067)
  point P0 (-21.5649, 7.5235)
  point P1 (-22.3696, 6.8841)
  point P2 (-23.5751, 6.9445)
  point P3 (-24.6635, 7.7463)
  point P4 (-24.7419, 8.6136)
  point P5 (-23.8777, 9.3503)
  point P6 (-23.7301, 9.3422)
  point P7 (-23.5475, 8.9689)
  point P8 (-23.8083, 8.7903)
  point P9 (-24.1792, 8.4336)
  point P10 (-24.1002, 7.9585)
  point P11 (-23.3884, 7.4887)
  point P12 (-22.1197, 7.7269)
  point P13 (-22.1984, 8.336)
  point P14 (-22.2743, 8.6105)
  point P15 (-21.8902, 8.7959)
  point P16 (-21.7348, 8.6674)
  point P17 (-22.5223, 3.9742)
  point P18 (-22.7793, 2.0739)
  point P19 (-26.109, 2.5148)
  point P20 (-25.837, 4.3881)
  point P21 (-23.1539, 1.2367)
  point P22 (-22.8643, 0.9323)
  point P23 (-22.8505, -1.2295)
  point P24 (-23.1301, -1.5313)
  point P25 (-26.2222, -0.1963)
  point P26 (-22.015, -6.0818)
  point P27 (-22.313, -7.0655)
  point P28 (-23.3387, -7.7016)
  point P29 (-24.69, -7.6614)
  point P30 (-25.2479, -6.9928)
  point P31 (-24.9563, -5.8953)
  point P32 (-24.8303, -5.818)
  point P33 (-24.4678, -6.0211)
  point P34 (-24.5806, -6.3164)
  point P35 (-24.6827, -6.8207)
  point P36 (-24.3475, -7.1664)
  point P37 (-23.4948, -7.1479)
  point P38 (-22.587, -6.2301)
  point P39 (-22.9983, -5.774)
  point P40 (-23.2168, -5.5914)
  point P41 (-23.0064, -5.2204)
  point P42 (-22.8056, -5.2377)
  point P43 (-20.0767, -10.9844)
  point P44 (-20.7343, -13.0001)
  point P45 (-18.6529, -13.2822)
  point P46 (-22.0936, -15.3923)
  point P47 (-23.5248, -13.1355)
  point P48 (-24.2914, -9.06)
  point P49 (-23.1616, -8.6822)
  point P50 (-21.8023, -8.0057)
  point P51 (-22.7455, -2.435)
  point P52 (-22.4915, -4.1639)
  point P53 (-25.7963, -4.6494)
  point P54 (-26.0503, -2.9205)
  point P55 (-22.2419, 5.2711)
  point P56 (-25.4907, 6.0473)
  point P57 (-20.0417, 11.6603)
  point P58 (-19.9228, 11.2574)
  point P59 (-20.8965, 9.3272)
  point P60 (-21.2829, 9.1861)
  point P61 (-23.4258, 11.7844)
  point P62 (-22.0274, 14.188)
  point P63 (-18.4597, 14.1045)
  point P64 (17.1726, -17.3309)
  point P65 (17.1726, 17.3309)
  dimension "d19" = 2.54
  dimension "d20" = 0.635
  dimension "d22" = 3.81
  dimension "d23" = 6.35
  dimension "d24" = 3.556
  dimension "d25" = 135
  dimension "d26" = 1.27
  dimension "d27" = 0.635
  dimension "d28" = 12.7
  dimension "d29" = 5.08
  dimension "d30" = 1.651
extrude "Extrusion3" cut sketch "Sketch4" along normal through all contours A33 | A33 L59 A35 L60 | A35 L56 A36 L57 keep common part
fillet "Fillet1" radius 3.175 4 edges at (20.2945, 2.8973, -15.2039) (19.1153, 3.0642, -14.7322) (24.3492, 2.9637, -5.067) (23.17, 3.1341, -4.5954)
sketch "Sketch5" plane through (0, 1.27, 0) normal (0, -1, 0) x (1, 0, 0)
  circle A0 centre (24.1681, -3.81) radius 0.635 projected
  arc A1 (22.7282, -5.6999) -> (22.9144, -4.0131) centre (19.7803, -4.5208) ccw projected
  line L0 (19.6739, -13.3357) -> (22.7282, -5.6999) projected
  arc A2 (18.2402, -14.9472) -> (19.6739, -13.3357) centre (16.726, -12.1565) ccw projected
  arc A3 (18.2402, -14.9472) -> (17.3155, -16.3716) centre (19.0881, -16.51) ccw projected
  line L1 (18.7629, -15.7512) -> (17.3155, -16.3716) projected
  arc A4 (19.4133, -17.2688) -> (18.7629, -15.7512) centre (19.0881, -16.51) ccw projected
  line L2 (17.9659, -17.8891) -> (19.4133, -17.2688) projected
  arc A5 (17.9659, -17.8891) -> (20.7799, -15.9631) centre (19.0881, -16.51) ccw projected
  arc A6 (20.8531, -13.8074) -> (20.7799, -15.9631) centre (23.801, -14.9865) ccw projected
  line L3 (23.9074, -6.1716) -> (20.8531, -13.8074) projected
  arc A7 (24.9359, -4.8216) -> (23.9074, -6.1716) centre (26.8553, -7.3508) ccw projected
  arc A8 (24.9359, -4.8216) -> (22.9144, -4.0131) centre (24.1681, -3.81) ccw projected
  point P0 (0, 0)
extrude "Extrusion4" add sketch "Sketch5" along normal blind 0.5
equation "\"d27\" = 0.5 * d26"
properties part number "Team Pin Mechanical-Right Wrench"
